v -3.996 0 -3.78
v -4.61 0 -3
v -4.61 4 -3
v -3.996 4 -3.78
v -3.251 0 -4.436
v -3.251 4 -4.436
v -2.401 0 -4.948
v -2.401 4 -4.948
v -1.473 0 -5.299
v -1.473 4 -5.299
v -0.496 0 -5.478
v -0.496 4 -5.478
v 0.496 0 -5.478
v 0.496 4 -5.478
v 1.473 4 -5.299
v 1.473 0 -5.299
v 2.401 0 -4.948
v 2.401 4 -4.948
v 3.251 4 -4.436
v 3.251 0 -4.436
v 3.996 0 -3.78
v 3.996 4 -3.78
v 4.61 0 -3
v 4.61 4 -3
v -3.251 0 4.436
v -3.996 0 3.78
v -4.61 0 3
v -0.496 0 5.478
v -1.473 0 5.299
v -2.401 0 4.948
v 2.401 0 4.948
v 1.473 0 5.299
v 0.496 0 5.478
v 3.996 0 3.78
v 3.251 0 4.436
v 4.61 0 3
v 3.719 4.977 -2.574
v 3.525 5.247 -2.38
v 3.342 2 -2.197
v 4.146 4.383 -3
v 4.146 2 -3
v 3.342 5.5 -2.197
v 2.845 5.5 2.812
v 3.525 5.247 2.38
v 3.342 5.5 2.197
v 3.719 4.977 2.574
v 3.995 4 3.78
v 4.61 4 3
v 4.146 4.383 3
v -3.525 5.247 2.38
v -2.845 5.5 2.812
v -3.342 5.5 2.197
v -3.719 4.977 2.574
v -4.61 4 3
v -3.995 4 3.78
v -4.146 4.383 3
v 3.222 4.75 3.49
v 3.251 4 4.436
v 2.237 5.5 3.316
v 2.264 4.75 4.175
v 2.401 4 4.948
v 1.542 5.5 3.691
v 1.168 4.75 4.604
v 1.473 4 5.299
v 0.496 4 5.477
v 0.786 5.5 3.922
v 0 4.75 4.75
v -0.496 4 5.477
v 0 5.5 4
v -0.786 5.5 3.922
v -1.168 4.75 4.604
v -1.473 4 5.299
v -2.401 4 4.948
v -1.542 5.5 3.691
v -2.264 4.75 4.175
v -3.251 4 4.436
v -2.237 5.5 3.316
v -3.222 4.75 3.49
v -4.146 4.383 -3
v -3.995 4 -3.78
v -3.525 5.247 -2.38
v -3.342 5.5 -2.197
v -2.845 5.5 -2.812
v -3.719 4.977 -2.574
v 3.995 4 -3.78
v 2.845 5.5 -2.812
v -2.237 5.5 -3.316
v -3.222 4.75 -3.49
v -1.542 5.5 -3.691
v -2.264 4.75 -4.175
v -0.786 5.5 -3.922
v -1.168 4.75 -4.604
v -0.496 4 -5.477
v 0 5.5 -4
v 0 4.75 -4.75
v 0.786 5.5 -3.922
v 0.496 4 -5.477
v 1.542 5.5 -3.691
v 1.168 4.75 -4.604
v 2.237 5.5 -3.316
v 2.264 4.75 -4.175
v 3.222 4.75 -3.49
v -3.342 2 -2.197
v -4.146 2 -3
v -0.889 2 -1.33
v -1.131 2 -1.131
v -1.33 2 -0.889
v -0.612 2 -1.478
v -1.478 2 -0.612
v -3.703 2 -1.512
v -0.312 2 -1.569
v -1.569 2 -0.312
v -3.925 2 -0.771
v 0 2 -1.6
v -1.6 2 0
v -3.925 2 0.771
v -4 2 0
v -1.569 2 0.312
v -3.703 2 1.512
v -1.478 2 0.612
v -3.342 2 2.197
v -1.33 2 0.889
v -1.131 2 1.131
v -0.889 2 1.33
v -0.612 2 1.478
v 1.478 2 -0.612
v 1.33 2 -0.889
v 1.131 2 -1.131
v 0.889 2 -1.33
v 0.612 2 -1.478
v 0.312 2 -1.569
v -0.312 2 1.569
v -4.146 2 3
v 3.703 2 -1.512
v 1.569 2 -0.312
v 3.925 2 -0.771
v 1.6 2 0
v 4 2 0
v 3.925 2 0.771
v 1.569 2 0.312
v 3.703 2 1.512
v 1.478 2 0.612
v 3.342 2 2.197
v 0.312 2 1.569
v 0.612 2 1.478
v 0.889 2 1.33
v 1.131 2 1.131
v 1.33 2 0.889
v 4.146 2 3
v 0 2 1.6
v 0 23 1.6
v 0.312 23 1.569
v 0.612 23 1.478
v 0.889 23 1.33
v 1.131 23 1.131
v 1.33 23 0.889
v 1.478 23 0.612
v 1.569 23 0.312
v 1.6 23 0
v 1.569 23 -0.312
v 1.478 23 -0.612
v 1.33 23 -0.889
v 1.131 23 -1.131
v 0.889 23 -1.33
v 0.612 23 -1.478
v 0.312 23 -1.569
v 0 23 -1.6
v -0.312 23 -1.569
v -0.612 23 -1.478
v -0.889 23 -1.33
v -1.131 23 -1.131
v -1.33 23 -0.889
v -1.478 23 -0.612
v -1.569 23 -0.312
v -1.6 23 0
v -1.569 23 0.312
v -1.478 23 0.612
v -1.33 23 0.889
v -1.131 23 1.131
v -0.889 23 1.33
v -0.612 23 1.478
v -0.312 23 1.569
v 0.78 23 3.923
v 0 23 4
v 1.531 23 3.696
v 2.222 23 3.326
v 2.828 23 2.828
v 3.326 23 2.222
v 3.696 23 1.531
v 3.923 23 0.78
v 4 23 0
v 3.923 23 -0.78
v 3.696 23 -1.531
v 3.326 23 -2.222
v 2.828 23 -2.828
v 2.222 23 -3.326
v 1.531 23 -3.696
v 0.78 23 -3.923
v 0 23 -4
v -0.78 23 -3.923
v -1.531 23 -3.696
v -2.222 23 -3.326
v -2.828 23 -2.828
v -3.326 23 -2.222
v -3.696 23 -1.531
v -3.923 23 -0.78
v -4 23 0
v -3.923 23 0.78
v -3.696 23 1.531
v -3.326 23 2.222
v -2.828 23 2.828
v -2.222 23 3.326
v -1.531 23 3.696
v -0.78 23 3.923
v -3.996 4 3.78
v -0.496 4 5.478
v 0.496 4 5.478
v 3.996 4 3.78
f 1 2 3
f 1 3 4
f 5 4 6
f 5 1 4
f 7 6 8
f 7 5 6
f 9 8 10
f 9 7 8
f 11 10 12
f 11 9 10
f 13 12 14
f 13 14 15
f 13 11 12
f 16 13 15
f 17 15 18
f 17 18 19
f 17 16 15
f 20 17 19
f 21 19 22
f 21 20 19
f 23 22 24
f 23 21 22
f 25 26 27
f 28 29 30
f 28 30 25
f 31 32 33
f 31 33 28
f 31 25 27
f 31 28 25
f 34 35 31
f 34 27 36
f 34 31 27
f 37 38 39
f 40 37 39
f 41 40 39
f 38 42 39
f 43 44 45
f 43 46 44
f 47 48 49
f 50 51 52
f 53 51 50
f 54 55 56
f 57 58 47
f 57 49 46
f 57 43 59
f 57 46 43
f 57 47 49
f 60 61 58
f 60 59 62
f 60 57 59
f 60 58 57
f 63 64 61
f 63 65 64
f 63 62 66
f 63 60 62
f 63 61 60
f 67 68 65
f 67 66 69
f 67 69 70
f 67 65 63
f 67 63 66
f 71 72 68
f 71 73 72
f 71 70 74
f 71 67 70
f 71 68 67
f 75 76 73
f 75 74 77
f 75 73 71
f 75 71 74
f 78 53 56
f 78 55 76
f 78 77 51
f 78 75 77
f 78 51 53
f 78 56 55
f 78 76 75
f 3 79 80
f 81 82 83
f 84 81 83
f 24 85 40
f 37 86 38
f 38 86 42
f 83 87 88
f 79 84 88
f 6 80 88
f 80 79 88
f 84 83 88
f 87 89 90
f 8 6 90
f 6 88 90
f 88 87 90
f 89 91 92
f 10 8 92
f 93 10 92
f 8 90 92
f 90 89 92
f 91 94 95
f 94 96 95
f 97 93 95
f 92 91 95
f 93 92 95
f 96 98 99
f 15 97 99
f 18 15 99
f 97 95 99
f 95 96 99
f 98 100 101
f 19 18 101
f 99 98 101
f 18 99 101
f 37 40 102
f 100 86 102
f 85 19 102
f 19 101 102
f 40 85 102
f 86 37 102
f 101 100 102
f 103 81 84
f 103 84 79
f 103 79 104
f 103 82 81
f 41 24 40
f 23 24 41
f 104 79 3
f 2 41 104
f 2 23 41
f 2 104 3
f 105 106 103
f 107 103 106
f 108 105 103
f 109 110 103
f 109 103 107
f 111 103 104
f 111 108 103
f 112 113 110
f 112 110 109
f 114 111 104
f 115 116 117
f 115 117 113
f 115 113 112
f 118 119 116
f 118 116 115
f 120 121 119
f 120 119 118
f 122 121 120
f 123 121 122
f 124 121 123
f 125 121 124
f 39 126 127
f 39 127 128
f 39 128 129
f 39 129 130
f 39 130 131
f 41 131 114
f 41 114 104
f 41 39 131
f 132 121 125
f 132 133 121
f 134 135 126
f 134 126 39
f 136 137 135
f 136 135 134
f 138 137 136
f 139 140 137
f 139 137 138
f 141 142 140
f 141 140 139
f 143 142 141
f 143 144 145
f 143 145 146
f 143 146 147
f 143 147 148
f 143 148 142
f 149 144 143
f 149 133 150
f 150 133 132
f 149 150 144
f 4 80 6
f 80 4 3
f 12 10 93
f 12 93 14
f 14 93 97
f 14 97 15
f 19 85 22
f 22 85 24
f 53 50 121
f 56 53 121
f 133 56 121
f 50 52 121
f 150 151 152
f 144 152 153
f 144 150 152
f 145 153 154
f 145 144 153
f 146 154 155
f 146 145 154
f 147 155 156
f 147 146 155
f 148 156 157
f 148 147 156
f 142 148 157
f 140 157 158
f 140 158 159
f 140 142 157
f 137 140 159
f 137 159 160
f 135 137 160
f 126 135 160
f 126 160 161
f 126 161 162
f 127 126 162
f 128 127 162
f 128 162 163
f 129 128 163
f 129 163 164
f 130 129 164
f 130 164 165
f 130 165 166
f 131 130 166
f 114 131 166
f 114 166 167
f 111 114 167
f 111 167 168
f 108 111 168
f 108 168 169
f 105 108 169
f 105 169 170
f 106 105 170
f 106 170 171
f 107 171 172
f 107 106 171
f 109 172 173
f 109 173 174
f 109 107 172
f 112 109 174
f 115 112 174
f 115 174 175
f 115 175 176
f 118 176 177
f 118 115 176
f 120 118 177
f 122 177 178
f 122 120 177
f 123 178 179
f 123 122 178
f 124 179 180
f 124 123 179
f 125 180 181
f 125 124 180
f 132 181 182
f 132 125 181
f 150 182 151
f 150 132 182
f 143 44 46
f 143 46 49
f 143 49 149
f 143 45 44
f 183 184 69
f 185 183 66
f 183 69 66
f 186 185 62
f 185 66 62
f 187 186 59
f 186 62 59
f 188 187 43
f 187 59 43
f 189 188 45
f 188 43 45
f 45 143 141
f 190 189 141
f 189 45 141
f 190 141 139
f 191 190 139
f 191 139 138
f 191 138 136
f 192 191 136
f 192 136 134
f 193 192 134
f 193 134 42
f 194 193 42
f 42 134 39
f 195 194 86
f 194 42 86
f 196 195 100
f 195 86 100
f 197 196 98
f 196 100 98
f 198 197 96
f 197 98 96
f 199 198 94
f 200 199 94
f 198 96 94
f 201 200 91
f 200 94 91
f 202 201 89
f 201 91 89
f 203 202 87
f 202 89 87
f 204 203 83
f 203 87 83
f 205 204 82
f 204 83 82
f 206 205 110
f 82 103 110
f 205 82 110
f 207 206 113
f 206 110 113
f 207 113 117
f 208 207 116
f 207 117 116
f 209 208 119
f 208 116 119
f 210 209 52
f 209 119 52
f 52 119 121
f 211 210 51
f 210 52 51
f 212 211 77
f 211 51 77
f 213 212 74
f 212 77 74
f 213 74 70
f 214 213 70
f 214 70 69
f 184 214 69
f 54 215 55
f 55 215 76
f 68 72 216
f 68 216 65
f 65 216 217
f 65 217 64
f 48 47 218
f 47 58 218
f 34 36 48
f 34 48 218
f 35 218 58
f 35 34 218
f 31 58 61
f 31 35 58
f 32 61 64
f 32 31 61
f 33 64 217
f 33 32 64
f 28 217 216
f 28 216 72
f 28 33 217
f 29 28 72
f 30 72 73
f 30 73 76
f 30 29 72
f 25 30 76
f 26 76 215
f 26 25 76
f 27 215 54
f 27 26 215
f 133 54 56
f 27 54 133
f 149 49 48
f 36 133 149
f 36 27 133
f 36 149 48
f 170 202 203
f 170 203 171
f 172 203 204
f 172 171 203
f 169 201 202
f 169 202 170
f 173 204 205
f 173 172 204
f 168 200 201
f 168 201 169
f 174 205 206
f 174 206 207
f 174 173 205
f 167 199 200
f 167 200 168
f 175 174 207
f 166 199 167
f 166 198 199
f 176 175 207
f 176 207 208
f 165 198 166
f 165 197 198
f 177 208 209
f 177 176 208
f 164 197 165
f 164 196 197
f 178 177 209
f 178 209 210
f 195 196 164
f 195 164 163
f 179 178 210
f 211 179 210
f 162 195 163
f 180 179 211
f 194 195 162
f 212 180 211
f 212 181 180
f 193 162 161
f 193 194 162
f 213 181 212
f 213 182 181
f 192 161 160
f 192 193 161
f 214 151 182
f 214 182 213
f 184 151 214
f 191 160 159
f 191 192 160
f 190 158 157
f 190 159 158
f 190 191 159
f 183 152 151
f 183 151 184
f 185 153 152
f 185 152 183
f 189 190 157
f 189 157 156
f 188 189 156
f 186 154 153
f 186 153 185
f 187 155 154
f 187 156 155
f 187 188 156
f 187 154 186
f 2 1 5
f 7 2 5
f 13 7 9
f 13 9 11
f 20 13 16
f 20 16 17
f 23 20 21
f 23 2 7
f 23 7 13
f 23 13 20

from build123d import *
from OCP.BRepFilletAPI import BRepFilletAPI_MakeChamfer

# Parameters (mm, degrees)
SKETCH1_R           = 4
SKETCH1_R_2         = 1.6
BOSS_EXTRUDE1_DEPTH = 23
SKETCH3_W           = 13.555932204
SKETCH3_H           = 6
SKETCH3_R           = 1.6
CUT_EXTRUDE1_DEPTH  = 2
BOSS_EXTRUDE2_DEPTH = 4
CHAMFER1_SIZE       = 1.5
CHAMFER1_SIZE_2     = 1.062746067


with BuildPart() as part:
    # Sketch1 → Boss-Extrude1 (new body)
    with BuildSketch(Plane(origin=(0, 0, 0), x_dir=(1, 0, 0), z_dir=(0, 1, 0))):
        with Locations(Location((0, 0, 0), (0, 0, 270))):
            Circle(SKETCH1_R)
        with Locations(Location((0, 0, 0), (0, 0, 270))):
            Circle(SKETCH1_R_2, mode=Mode.SUBTRACT)
    extrude(amount=BOSS_EXTRUDE1_DEPTH)

    # Sketch3 → Cut-Extrude1 (cut)
    with BuildSketch(Plane.XZ):
        Rectangle(SKETCH3_W, SKETCH3_H)
        with Locations(Location((0, 0, 0), (0, 0, 270))):
            Circle(SKETCH3_R, mode=Mode.SUBTRACT)
    extrude(amount=-CUT_EXTRUDE1_DEPTH, mode=Mode.SUBTRACT)

    # Sketch5 → Boss-Extrude2 (add)
    with BuildSketch(Plane.XZ):
        with BuildLine():
            Line((-4.609772229, 3), (4.609772229, 3))
            ThreePointArc((4.609772229, 3), (0, 5.5), (-4.609772229, 3))
        make_face()
        with BuildLine():
            Line((4.609772229, -3), (-4.609772229, -3))
            ThreePointArc((-4.609772229, -3), (0, -5.5), (4.609772229, -3))
        make_face()
    extrude(amount=-BOSS_EXTRUDE2_DEPTH)

    # Chamfer1
    chamfer1_edges_1 = [part.edges().sort_by_distance(p)[0] for p in [
        (2.645751311, 3, -3),
    ]]
    chamfer1_side_1 = [part.faces().sort_by_distance(p)[0] for p in [
        (2.667006232, 3, -3),
    ]]
    chamfer1_edges_2 = [part.edges().sort_by_distance(p)[0] for p in [
        (-2.645751311, 3, -3),
    ]]
    chamfer1_side_2 = [part.faces().sort_by_distance(p)[0] for p in [
        (-2.667006232, 3, -3),
    ]]
    chamfer1_edges_3 = [part.edges().sort_by_distance(p)[0] for p in [
        (2.645751311, 3, 3),
    ]]
    chamfer1_side_3 = [part.faces().sort_by_distance(p)[0] for p in [
        (2.667006232, 3, 3),
    ]]
    chamfer1_edges_4 = [part.edges().sort_by_distance(p)[0] for p in [
        (-2.645751311, 3, 3),
    ]]
    chamfer1_side_4 = [part.faces().sort_by_distance(p)[0] for p in [
        (-2.667006232, 3, 3),
    ]]
    chamfer1_edges_5 = [part.edges().sort_by_distance(p)[0] for p in [
        (1.414213562, 4, 3.741657387),
        (0, 4, -4),
    ]]
    chamfer1 = BRepFilletAPI_MakeChamfer(part.part.solid().wrapped)
    for e in chamfer1_edges_1:
        chamfer1.Add(CHAMFER1_SIZE - 0.0001, CHAMFER1_SIZE_2 - 0.0001, e.wrapped, chamfer1_side_1[0].wrapped)
    for e in chamfer1_edges_2:
        chamfer1.Add(CHAMFER1_SIZE - 0.0001, CHAMFER1_SIZE_2 - 0.0001, e.wrapped, chamfer1_side_2[0].wrapped)
    for e in chamfer1_edges_3:
        chamfer1.Add(CHAMFER1_SIZE - 0.0001, CHAMFER1_SIZE_2 - 0.0001, e.wrapped, chamfer1_side_3[0].wrapped)
    for e in chamfer1_edges_4:
        chamfer1.Add(CHAMFER1_SIZE - 0.0001, CHAMFER1_SIZE_2 - 0.0001, e.wrapped, chamfer1_side_4[0].wrapped)
    for e in chamfer1_edges_5:
        chamfer1.Add(CHAMFER1_SIZE - 0.0001, e.wrapped)
    add(Compound.cast(chamfer1.Shape()), mode=Mode.REPLACE)  # a hair under: the kernel refuses the full size


solid = part.part
